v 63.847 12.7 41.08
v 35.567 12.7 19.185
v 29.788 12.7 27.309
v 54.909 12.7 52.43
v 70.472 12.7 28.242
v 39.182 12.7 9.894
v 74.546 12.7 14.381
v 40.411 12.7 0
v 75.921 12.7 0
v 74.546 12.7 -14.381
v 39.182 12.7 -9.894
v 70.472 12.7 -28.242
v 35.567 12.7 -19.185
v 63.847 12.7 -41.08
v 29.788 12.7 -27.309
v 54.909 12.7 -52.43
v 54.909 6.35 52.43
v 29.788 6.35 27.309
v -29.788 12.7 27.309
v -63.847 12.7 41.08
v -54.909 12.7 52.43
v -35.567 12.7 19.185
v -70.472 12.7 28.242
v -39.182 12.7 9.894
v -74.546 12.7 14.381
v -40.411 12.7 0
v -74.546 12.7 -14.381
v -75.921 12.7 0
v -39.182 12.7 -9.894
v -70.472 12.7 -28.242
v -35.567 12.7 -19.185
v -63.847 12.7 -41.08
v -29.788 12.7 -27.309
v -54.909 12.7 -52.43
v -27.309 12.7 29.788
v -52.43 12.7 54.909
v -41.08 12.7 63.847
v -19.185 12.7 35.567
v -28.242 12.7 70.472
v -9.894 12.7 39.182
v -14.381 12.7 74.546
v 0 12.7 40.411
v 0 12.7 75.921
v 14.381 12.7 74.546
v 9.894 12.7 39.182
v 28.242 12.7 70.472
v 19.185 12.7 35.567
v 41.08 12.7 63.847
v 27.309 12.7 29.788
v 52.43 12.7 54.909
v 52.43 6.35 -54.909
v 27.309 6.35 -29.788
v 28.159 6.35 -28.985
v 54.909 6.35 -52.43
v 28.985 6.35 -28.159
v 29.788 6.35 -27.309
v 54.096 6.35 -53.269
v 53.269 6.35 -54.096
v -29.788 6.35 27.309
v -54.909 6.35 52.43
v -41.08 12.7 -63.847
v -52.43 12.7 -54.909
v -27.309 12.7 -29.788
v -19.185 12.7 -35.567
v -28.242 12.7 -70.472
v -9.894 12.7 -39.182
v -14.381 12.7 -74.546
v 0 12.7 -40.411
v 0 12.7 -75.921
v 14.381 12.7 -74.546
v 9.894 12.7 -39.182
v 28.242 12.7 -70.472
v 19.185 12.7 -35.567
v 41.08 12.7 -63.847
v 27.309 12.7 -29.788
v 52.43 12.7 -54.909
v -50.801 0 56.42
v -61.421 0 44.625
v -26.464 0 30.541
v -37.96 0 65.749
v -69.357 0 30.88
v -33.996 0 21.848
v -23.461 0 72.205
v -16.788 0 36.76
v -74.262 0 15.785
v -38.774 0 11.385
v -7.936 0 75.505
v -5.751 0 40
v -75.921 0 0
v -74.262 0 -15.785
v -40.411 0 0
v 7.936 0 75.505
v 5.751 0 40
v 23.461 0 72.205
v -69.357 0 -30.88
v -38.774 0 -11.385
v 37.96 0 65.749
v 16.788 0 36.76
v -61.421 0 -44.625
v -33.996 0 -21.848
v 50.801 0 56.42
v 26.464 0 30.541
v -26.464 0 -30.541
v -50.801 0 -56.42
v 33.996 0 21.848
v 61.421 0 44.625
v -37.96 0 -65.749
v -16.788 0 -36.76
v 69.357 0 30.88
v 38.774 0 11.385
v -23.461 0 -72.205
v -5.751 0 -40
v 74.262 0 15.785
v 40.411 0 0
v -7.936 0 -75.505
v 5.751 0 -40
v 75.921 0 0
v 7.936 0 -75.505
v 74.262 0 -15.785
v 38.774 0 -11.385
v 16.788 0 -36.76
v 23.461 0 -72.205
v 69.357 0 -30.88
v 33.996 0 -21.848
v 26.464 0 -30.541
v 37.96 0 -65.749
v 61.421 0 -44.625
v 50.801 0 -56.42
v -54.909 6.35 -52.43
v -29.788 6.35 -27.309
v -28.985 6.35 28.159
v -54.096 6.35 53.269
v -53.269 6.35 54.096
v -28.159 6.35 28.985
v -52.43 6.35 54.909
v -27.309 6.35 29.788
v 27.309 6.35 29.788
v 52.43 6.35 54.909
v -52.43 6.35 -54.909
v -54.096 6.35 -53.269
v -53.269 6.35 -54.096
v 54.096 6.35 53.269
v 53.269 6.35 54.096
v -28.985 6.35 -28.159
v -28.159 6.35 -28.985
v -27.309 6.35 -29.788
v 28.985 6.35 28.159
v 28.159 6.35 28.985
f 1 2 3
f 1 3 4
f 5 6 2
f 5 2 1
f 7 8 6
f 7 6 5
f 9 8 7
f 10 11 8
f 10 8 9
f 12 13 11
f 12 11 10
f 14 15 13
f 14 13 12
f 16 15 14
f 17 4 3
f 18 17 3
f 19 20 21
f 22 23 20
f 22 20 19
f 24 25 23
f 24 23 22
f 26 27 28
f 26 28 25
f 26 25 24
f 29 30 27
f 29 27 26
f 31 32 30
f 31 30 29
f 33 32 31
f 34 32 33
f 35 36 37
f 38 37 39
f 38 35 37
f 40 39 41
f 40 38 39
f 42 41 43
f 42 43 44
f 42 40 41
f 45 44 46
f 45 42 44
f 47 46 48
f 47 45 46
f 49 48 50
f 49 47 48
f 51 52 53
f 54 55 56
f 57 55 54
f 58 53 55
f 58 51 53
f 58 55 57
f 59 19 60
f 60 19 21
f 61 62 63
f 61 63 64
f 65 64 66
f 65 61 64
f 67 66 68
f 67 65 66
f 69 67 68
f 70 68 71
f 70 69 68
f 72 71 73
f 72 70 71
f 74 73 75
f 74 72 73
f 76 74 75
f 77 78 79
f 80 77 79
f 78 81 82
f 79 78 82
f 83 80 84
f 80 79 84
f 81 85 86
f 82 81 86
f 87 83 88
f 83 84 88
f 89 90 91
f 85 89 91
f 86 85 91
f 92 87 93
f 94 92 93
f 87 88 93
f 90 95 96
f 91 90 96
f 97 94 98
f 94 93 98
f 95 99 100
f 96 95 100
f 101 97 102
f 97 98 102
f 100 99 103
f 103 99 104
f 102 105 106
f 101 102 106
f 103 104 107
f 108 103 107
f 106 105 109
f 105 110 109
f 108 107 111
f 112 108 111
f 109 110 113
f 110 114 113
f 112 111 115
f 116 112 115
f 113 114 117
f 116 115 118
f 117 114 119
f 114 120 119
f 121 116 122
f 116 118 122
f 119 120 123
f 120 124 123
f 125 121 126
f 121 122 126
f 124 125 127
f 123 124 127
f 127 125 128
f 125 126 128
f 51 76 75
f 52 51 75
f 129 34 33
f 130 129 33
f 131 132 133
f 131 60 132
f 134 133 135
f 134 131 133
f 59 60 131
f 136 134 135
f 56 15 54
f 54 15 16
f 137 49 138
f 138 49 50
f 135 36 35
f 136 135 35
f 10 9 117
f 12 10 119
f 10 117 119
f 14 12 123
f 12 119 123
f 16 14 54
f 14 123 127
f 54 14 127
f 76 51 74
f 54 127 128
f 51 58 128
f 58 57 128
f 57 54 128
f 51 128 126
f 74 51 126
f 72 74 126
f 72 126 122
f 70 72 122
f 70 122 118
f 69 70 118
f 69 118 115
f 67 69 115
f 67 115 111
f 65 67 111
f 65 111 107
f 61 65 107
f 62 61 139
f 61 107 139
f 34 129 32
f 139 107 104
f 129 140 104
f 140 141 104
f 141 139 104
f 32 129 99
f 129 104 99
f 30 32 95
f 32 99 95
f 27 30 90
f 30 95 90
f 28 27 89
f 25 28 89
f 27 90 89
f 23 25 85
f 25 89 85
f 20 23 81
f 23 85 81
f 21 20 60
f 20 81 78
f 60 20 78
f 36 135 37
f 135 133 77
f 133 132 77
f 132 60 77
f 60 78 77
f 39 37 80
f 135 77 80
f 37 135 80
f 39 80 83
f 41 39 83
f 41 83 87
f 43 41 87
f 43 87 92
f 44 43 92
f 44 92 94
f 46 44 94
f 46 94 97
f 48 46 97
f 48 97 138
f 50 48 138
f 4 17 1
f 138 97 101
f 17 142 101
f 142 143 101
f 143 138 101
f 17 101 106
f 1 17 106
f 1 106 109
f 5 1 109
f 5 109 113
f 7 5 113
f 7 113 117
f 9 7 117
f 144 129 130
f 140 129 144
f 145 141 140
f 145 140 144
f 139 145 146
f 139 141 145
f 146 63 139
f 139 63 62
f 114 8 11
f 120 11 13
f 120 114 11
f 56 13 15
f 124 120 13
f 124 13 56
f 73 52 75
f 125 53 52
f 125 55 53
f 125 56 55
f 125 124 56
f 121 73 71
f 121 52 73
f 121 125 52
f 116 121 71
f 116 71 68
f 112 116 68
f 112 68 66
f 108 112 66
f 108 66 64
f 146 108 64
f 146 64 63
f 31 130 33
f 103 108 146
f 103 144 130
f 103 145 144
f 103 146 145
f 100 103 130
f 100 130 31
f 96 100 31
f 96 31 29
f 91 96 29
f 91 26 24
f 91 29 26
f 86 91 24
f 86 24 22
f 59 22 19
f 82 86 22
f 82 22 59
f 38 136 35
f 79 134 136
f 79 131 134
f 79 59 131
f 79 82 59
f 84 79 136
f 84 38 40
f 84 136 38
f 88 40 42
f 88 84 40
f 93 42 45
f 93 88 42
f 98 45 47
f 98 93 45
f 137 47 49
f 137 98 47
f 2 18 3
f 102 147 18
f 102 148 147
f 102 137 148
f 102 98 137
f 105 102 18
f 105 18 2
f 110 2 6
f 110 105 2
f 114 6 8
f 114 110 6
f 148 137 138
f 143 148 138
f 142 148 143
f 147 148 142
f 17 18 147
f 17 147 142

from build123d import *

# Parameters (mm, degrees)
SKETCH1_R           = 75.9206
BOSS_EXTRUDE1_DEPTH = 12.7
SKETCH1_10_R        = 40.4114
CUT_EXTRUDE2_DEPTH  = 13.7
CUT_EXTRUDE5_DEPTH  = 6.35


with BuildPart() as part:
    # Sketch1 → Boss-Extrude1 (new body)
    with BuildSketch(Plane(origin=(0, 0, 0), x_dir=(1, 0, 0), z_dir=(0, 1, 0))):
        Circle(SKETCH1_R)
    extrude(amount=BOSS_EXTRUDE1_DEPTH)

    # Sketch1<10> → Cut-Extrude2 (cut, through all)
    with BuildSketch(Plane(origin=(0, 0, 0), x_dir=(1, 0, 0), z_dir=(0, 1, 0))):
        Circle(SKETCH1_10_R)
    extrude(amount=CUT_EXTRUDE2_DEPTH, mode=Mode.SUBTRACT)

    # Sketch3 → Cut-Extrude5 (cut)
    with BuildSketch(Plane(origin=(0, 12.7, 0), x_dir=(1, 0, 0), z_dir=(0, 1, 0))):
        Polygon((-28.180043708, 25.701493018), (-25.701493019, 28.180043708), (-60.52670499, 63.00525568), (-63.00525568, 60.52670499), align=None)
        Polygon((28.180043708, 25.701493019), (63.00525568, 60.52670499), (60.52670499, 63.00525568), (25.701493019, 28.180043708), align=None)
        Polygon((25.701493019, -28.180043708), (60.52670499, -63.00525568), (63.00525568, -60.52670499), (28.180043708, -25.701493018), align=None)
        Polygon((-28.180043708, -25.701493019), (-63.00525568, -60.52670499), (-60.52670499, -63.00525568), (-25.701493018, -28.180043708), align=None)
    extrude(amount=-CUT_EXTRUDE5_DEPTH, mode=Mode.SUBTRACT)


solid = part.part
